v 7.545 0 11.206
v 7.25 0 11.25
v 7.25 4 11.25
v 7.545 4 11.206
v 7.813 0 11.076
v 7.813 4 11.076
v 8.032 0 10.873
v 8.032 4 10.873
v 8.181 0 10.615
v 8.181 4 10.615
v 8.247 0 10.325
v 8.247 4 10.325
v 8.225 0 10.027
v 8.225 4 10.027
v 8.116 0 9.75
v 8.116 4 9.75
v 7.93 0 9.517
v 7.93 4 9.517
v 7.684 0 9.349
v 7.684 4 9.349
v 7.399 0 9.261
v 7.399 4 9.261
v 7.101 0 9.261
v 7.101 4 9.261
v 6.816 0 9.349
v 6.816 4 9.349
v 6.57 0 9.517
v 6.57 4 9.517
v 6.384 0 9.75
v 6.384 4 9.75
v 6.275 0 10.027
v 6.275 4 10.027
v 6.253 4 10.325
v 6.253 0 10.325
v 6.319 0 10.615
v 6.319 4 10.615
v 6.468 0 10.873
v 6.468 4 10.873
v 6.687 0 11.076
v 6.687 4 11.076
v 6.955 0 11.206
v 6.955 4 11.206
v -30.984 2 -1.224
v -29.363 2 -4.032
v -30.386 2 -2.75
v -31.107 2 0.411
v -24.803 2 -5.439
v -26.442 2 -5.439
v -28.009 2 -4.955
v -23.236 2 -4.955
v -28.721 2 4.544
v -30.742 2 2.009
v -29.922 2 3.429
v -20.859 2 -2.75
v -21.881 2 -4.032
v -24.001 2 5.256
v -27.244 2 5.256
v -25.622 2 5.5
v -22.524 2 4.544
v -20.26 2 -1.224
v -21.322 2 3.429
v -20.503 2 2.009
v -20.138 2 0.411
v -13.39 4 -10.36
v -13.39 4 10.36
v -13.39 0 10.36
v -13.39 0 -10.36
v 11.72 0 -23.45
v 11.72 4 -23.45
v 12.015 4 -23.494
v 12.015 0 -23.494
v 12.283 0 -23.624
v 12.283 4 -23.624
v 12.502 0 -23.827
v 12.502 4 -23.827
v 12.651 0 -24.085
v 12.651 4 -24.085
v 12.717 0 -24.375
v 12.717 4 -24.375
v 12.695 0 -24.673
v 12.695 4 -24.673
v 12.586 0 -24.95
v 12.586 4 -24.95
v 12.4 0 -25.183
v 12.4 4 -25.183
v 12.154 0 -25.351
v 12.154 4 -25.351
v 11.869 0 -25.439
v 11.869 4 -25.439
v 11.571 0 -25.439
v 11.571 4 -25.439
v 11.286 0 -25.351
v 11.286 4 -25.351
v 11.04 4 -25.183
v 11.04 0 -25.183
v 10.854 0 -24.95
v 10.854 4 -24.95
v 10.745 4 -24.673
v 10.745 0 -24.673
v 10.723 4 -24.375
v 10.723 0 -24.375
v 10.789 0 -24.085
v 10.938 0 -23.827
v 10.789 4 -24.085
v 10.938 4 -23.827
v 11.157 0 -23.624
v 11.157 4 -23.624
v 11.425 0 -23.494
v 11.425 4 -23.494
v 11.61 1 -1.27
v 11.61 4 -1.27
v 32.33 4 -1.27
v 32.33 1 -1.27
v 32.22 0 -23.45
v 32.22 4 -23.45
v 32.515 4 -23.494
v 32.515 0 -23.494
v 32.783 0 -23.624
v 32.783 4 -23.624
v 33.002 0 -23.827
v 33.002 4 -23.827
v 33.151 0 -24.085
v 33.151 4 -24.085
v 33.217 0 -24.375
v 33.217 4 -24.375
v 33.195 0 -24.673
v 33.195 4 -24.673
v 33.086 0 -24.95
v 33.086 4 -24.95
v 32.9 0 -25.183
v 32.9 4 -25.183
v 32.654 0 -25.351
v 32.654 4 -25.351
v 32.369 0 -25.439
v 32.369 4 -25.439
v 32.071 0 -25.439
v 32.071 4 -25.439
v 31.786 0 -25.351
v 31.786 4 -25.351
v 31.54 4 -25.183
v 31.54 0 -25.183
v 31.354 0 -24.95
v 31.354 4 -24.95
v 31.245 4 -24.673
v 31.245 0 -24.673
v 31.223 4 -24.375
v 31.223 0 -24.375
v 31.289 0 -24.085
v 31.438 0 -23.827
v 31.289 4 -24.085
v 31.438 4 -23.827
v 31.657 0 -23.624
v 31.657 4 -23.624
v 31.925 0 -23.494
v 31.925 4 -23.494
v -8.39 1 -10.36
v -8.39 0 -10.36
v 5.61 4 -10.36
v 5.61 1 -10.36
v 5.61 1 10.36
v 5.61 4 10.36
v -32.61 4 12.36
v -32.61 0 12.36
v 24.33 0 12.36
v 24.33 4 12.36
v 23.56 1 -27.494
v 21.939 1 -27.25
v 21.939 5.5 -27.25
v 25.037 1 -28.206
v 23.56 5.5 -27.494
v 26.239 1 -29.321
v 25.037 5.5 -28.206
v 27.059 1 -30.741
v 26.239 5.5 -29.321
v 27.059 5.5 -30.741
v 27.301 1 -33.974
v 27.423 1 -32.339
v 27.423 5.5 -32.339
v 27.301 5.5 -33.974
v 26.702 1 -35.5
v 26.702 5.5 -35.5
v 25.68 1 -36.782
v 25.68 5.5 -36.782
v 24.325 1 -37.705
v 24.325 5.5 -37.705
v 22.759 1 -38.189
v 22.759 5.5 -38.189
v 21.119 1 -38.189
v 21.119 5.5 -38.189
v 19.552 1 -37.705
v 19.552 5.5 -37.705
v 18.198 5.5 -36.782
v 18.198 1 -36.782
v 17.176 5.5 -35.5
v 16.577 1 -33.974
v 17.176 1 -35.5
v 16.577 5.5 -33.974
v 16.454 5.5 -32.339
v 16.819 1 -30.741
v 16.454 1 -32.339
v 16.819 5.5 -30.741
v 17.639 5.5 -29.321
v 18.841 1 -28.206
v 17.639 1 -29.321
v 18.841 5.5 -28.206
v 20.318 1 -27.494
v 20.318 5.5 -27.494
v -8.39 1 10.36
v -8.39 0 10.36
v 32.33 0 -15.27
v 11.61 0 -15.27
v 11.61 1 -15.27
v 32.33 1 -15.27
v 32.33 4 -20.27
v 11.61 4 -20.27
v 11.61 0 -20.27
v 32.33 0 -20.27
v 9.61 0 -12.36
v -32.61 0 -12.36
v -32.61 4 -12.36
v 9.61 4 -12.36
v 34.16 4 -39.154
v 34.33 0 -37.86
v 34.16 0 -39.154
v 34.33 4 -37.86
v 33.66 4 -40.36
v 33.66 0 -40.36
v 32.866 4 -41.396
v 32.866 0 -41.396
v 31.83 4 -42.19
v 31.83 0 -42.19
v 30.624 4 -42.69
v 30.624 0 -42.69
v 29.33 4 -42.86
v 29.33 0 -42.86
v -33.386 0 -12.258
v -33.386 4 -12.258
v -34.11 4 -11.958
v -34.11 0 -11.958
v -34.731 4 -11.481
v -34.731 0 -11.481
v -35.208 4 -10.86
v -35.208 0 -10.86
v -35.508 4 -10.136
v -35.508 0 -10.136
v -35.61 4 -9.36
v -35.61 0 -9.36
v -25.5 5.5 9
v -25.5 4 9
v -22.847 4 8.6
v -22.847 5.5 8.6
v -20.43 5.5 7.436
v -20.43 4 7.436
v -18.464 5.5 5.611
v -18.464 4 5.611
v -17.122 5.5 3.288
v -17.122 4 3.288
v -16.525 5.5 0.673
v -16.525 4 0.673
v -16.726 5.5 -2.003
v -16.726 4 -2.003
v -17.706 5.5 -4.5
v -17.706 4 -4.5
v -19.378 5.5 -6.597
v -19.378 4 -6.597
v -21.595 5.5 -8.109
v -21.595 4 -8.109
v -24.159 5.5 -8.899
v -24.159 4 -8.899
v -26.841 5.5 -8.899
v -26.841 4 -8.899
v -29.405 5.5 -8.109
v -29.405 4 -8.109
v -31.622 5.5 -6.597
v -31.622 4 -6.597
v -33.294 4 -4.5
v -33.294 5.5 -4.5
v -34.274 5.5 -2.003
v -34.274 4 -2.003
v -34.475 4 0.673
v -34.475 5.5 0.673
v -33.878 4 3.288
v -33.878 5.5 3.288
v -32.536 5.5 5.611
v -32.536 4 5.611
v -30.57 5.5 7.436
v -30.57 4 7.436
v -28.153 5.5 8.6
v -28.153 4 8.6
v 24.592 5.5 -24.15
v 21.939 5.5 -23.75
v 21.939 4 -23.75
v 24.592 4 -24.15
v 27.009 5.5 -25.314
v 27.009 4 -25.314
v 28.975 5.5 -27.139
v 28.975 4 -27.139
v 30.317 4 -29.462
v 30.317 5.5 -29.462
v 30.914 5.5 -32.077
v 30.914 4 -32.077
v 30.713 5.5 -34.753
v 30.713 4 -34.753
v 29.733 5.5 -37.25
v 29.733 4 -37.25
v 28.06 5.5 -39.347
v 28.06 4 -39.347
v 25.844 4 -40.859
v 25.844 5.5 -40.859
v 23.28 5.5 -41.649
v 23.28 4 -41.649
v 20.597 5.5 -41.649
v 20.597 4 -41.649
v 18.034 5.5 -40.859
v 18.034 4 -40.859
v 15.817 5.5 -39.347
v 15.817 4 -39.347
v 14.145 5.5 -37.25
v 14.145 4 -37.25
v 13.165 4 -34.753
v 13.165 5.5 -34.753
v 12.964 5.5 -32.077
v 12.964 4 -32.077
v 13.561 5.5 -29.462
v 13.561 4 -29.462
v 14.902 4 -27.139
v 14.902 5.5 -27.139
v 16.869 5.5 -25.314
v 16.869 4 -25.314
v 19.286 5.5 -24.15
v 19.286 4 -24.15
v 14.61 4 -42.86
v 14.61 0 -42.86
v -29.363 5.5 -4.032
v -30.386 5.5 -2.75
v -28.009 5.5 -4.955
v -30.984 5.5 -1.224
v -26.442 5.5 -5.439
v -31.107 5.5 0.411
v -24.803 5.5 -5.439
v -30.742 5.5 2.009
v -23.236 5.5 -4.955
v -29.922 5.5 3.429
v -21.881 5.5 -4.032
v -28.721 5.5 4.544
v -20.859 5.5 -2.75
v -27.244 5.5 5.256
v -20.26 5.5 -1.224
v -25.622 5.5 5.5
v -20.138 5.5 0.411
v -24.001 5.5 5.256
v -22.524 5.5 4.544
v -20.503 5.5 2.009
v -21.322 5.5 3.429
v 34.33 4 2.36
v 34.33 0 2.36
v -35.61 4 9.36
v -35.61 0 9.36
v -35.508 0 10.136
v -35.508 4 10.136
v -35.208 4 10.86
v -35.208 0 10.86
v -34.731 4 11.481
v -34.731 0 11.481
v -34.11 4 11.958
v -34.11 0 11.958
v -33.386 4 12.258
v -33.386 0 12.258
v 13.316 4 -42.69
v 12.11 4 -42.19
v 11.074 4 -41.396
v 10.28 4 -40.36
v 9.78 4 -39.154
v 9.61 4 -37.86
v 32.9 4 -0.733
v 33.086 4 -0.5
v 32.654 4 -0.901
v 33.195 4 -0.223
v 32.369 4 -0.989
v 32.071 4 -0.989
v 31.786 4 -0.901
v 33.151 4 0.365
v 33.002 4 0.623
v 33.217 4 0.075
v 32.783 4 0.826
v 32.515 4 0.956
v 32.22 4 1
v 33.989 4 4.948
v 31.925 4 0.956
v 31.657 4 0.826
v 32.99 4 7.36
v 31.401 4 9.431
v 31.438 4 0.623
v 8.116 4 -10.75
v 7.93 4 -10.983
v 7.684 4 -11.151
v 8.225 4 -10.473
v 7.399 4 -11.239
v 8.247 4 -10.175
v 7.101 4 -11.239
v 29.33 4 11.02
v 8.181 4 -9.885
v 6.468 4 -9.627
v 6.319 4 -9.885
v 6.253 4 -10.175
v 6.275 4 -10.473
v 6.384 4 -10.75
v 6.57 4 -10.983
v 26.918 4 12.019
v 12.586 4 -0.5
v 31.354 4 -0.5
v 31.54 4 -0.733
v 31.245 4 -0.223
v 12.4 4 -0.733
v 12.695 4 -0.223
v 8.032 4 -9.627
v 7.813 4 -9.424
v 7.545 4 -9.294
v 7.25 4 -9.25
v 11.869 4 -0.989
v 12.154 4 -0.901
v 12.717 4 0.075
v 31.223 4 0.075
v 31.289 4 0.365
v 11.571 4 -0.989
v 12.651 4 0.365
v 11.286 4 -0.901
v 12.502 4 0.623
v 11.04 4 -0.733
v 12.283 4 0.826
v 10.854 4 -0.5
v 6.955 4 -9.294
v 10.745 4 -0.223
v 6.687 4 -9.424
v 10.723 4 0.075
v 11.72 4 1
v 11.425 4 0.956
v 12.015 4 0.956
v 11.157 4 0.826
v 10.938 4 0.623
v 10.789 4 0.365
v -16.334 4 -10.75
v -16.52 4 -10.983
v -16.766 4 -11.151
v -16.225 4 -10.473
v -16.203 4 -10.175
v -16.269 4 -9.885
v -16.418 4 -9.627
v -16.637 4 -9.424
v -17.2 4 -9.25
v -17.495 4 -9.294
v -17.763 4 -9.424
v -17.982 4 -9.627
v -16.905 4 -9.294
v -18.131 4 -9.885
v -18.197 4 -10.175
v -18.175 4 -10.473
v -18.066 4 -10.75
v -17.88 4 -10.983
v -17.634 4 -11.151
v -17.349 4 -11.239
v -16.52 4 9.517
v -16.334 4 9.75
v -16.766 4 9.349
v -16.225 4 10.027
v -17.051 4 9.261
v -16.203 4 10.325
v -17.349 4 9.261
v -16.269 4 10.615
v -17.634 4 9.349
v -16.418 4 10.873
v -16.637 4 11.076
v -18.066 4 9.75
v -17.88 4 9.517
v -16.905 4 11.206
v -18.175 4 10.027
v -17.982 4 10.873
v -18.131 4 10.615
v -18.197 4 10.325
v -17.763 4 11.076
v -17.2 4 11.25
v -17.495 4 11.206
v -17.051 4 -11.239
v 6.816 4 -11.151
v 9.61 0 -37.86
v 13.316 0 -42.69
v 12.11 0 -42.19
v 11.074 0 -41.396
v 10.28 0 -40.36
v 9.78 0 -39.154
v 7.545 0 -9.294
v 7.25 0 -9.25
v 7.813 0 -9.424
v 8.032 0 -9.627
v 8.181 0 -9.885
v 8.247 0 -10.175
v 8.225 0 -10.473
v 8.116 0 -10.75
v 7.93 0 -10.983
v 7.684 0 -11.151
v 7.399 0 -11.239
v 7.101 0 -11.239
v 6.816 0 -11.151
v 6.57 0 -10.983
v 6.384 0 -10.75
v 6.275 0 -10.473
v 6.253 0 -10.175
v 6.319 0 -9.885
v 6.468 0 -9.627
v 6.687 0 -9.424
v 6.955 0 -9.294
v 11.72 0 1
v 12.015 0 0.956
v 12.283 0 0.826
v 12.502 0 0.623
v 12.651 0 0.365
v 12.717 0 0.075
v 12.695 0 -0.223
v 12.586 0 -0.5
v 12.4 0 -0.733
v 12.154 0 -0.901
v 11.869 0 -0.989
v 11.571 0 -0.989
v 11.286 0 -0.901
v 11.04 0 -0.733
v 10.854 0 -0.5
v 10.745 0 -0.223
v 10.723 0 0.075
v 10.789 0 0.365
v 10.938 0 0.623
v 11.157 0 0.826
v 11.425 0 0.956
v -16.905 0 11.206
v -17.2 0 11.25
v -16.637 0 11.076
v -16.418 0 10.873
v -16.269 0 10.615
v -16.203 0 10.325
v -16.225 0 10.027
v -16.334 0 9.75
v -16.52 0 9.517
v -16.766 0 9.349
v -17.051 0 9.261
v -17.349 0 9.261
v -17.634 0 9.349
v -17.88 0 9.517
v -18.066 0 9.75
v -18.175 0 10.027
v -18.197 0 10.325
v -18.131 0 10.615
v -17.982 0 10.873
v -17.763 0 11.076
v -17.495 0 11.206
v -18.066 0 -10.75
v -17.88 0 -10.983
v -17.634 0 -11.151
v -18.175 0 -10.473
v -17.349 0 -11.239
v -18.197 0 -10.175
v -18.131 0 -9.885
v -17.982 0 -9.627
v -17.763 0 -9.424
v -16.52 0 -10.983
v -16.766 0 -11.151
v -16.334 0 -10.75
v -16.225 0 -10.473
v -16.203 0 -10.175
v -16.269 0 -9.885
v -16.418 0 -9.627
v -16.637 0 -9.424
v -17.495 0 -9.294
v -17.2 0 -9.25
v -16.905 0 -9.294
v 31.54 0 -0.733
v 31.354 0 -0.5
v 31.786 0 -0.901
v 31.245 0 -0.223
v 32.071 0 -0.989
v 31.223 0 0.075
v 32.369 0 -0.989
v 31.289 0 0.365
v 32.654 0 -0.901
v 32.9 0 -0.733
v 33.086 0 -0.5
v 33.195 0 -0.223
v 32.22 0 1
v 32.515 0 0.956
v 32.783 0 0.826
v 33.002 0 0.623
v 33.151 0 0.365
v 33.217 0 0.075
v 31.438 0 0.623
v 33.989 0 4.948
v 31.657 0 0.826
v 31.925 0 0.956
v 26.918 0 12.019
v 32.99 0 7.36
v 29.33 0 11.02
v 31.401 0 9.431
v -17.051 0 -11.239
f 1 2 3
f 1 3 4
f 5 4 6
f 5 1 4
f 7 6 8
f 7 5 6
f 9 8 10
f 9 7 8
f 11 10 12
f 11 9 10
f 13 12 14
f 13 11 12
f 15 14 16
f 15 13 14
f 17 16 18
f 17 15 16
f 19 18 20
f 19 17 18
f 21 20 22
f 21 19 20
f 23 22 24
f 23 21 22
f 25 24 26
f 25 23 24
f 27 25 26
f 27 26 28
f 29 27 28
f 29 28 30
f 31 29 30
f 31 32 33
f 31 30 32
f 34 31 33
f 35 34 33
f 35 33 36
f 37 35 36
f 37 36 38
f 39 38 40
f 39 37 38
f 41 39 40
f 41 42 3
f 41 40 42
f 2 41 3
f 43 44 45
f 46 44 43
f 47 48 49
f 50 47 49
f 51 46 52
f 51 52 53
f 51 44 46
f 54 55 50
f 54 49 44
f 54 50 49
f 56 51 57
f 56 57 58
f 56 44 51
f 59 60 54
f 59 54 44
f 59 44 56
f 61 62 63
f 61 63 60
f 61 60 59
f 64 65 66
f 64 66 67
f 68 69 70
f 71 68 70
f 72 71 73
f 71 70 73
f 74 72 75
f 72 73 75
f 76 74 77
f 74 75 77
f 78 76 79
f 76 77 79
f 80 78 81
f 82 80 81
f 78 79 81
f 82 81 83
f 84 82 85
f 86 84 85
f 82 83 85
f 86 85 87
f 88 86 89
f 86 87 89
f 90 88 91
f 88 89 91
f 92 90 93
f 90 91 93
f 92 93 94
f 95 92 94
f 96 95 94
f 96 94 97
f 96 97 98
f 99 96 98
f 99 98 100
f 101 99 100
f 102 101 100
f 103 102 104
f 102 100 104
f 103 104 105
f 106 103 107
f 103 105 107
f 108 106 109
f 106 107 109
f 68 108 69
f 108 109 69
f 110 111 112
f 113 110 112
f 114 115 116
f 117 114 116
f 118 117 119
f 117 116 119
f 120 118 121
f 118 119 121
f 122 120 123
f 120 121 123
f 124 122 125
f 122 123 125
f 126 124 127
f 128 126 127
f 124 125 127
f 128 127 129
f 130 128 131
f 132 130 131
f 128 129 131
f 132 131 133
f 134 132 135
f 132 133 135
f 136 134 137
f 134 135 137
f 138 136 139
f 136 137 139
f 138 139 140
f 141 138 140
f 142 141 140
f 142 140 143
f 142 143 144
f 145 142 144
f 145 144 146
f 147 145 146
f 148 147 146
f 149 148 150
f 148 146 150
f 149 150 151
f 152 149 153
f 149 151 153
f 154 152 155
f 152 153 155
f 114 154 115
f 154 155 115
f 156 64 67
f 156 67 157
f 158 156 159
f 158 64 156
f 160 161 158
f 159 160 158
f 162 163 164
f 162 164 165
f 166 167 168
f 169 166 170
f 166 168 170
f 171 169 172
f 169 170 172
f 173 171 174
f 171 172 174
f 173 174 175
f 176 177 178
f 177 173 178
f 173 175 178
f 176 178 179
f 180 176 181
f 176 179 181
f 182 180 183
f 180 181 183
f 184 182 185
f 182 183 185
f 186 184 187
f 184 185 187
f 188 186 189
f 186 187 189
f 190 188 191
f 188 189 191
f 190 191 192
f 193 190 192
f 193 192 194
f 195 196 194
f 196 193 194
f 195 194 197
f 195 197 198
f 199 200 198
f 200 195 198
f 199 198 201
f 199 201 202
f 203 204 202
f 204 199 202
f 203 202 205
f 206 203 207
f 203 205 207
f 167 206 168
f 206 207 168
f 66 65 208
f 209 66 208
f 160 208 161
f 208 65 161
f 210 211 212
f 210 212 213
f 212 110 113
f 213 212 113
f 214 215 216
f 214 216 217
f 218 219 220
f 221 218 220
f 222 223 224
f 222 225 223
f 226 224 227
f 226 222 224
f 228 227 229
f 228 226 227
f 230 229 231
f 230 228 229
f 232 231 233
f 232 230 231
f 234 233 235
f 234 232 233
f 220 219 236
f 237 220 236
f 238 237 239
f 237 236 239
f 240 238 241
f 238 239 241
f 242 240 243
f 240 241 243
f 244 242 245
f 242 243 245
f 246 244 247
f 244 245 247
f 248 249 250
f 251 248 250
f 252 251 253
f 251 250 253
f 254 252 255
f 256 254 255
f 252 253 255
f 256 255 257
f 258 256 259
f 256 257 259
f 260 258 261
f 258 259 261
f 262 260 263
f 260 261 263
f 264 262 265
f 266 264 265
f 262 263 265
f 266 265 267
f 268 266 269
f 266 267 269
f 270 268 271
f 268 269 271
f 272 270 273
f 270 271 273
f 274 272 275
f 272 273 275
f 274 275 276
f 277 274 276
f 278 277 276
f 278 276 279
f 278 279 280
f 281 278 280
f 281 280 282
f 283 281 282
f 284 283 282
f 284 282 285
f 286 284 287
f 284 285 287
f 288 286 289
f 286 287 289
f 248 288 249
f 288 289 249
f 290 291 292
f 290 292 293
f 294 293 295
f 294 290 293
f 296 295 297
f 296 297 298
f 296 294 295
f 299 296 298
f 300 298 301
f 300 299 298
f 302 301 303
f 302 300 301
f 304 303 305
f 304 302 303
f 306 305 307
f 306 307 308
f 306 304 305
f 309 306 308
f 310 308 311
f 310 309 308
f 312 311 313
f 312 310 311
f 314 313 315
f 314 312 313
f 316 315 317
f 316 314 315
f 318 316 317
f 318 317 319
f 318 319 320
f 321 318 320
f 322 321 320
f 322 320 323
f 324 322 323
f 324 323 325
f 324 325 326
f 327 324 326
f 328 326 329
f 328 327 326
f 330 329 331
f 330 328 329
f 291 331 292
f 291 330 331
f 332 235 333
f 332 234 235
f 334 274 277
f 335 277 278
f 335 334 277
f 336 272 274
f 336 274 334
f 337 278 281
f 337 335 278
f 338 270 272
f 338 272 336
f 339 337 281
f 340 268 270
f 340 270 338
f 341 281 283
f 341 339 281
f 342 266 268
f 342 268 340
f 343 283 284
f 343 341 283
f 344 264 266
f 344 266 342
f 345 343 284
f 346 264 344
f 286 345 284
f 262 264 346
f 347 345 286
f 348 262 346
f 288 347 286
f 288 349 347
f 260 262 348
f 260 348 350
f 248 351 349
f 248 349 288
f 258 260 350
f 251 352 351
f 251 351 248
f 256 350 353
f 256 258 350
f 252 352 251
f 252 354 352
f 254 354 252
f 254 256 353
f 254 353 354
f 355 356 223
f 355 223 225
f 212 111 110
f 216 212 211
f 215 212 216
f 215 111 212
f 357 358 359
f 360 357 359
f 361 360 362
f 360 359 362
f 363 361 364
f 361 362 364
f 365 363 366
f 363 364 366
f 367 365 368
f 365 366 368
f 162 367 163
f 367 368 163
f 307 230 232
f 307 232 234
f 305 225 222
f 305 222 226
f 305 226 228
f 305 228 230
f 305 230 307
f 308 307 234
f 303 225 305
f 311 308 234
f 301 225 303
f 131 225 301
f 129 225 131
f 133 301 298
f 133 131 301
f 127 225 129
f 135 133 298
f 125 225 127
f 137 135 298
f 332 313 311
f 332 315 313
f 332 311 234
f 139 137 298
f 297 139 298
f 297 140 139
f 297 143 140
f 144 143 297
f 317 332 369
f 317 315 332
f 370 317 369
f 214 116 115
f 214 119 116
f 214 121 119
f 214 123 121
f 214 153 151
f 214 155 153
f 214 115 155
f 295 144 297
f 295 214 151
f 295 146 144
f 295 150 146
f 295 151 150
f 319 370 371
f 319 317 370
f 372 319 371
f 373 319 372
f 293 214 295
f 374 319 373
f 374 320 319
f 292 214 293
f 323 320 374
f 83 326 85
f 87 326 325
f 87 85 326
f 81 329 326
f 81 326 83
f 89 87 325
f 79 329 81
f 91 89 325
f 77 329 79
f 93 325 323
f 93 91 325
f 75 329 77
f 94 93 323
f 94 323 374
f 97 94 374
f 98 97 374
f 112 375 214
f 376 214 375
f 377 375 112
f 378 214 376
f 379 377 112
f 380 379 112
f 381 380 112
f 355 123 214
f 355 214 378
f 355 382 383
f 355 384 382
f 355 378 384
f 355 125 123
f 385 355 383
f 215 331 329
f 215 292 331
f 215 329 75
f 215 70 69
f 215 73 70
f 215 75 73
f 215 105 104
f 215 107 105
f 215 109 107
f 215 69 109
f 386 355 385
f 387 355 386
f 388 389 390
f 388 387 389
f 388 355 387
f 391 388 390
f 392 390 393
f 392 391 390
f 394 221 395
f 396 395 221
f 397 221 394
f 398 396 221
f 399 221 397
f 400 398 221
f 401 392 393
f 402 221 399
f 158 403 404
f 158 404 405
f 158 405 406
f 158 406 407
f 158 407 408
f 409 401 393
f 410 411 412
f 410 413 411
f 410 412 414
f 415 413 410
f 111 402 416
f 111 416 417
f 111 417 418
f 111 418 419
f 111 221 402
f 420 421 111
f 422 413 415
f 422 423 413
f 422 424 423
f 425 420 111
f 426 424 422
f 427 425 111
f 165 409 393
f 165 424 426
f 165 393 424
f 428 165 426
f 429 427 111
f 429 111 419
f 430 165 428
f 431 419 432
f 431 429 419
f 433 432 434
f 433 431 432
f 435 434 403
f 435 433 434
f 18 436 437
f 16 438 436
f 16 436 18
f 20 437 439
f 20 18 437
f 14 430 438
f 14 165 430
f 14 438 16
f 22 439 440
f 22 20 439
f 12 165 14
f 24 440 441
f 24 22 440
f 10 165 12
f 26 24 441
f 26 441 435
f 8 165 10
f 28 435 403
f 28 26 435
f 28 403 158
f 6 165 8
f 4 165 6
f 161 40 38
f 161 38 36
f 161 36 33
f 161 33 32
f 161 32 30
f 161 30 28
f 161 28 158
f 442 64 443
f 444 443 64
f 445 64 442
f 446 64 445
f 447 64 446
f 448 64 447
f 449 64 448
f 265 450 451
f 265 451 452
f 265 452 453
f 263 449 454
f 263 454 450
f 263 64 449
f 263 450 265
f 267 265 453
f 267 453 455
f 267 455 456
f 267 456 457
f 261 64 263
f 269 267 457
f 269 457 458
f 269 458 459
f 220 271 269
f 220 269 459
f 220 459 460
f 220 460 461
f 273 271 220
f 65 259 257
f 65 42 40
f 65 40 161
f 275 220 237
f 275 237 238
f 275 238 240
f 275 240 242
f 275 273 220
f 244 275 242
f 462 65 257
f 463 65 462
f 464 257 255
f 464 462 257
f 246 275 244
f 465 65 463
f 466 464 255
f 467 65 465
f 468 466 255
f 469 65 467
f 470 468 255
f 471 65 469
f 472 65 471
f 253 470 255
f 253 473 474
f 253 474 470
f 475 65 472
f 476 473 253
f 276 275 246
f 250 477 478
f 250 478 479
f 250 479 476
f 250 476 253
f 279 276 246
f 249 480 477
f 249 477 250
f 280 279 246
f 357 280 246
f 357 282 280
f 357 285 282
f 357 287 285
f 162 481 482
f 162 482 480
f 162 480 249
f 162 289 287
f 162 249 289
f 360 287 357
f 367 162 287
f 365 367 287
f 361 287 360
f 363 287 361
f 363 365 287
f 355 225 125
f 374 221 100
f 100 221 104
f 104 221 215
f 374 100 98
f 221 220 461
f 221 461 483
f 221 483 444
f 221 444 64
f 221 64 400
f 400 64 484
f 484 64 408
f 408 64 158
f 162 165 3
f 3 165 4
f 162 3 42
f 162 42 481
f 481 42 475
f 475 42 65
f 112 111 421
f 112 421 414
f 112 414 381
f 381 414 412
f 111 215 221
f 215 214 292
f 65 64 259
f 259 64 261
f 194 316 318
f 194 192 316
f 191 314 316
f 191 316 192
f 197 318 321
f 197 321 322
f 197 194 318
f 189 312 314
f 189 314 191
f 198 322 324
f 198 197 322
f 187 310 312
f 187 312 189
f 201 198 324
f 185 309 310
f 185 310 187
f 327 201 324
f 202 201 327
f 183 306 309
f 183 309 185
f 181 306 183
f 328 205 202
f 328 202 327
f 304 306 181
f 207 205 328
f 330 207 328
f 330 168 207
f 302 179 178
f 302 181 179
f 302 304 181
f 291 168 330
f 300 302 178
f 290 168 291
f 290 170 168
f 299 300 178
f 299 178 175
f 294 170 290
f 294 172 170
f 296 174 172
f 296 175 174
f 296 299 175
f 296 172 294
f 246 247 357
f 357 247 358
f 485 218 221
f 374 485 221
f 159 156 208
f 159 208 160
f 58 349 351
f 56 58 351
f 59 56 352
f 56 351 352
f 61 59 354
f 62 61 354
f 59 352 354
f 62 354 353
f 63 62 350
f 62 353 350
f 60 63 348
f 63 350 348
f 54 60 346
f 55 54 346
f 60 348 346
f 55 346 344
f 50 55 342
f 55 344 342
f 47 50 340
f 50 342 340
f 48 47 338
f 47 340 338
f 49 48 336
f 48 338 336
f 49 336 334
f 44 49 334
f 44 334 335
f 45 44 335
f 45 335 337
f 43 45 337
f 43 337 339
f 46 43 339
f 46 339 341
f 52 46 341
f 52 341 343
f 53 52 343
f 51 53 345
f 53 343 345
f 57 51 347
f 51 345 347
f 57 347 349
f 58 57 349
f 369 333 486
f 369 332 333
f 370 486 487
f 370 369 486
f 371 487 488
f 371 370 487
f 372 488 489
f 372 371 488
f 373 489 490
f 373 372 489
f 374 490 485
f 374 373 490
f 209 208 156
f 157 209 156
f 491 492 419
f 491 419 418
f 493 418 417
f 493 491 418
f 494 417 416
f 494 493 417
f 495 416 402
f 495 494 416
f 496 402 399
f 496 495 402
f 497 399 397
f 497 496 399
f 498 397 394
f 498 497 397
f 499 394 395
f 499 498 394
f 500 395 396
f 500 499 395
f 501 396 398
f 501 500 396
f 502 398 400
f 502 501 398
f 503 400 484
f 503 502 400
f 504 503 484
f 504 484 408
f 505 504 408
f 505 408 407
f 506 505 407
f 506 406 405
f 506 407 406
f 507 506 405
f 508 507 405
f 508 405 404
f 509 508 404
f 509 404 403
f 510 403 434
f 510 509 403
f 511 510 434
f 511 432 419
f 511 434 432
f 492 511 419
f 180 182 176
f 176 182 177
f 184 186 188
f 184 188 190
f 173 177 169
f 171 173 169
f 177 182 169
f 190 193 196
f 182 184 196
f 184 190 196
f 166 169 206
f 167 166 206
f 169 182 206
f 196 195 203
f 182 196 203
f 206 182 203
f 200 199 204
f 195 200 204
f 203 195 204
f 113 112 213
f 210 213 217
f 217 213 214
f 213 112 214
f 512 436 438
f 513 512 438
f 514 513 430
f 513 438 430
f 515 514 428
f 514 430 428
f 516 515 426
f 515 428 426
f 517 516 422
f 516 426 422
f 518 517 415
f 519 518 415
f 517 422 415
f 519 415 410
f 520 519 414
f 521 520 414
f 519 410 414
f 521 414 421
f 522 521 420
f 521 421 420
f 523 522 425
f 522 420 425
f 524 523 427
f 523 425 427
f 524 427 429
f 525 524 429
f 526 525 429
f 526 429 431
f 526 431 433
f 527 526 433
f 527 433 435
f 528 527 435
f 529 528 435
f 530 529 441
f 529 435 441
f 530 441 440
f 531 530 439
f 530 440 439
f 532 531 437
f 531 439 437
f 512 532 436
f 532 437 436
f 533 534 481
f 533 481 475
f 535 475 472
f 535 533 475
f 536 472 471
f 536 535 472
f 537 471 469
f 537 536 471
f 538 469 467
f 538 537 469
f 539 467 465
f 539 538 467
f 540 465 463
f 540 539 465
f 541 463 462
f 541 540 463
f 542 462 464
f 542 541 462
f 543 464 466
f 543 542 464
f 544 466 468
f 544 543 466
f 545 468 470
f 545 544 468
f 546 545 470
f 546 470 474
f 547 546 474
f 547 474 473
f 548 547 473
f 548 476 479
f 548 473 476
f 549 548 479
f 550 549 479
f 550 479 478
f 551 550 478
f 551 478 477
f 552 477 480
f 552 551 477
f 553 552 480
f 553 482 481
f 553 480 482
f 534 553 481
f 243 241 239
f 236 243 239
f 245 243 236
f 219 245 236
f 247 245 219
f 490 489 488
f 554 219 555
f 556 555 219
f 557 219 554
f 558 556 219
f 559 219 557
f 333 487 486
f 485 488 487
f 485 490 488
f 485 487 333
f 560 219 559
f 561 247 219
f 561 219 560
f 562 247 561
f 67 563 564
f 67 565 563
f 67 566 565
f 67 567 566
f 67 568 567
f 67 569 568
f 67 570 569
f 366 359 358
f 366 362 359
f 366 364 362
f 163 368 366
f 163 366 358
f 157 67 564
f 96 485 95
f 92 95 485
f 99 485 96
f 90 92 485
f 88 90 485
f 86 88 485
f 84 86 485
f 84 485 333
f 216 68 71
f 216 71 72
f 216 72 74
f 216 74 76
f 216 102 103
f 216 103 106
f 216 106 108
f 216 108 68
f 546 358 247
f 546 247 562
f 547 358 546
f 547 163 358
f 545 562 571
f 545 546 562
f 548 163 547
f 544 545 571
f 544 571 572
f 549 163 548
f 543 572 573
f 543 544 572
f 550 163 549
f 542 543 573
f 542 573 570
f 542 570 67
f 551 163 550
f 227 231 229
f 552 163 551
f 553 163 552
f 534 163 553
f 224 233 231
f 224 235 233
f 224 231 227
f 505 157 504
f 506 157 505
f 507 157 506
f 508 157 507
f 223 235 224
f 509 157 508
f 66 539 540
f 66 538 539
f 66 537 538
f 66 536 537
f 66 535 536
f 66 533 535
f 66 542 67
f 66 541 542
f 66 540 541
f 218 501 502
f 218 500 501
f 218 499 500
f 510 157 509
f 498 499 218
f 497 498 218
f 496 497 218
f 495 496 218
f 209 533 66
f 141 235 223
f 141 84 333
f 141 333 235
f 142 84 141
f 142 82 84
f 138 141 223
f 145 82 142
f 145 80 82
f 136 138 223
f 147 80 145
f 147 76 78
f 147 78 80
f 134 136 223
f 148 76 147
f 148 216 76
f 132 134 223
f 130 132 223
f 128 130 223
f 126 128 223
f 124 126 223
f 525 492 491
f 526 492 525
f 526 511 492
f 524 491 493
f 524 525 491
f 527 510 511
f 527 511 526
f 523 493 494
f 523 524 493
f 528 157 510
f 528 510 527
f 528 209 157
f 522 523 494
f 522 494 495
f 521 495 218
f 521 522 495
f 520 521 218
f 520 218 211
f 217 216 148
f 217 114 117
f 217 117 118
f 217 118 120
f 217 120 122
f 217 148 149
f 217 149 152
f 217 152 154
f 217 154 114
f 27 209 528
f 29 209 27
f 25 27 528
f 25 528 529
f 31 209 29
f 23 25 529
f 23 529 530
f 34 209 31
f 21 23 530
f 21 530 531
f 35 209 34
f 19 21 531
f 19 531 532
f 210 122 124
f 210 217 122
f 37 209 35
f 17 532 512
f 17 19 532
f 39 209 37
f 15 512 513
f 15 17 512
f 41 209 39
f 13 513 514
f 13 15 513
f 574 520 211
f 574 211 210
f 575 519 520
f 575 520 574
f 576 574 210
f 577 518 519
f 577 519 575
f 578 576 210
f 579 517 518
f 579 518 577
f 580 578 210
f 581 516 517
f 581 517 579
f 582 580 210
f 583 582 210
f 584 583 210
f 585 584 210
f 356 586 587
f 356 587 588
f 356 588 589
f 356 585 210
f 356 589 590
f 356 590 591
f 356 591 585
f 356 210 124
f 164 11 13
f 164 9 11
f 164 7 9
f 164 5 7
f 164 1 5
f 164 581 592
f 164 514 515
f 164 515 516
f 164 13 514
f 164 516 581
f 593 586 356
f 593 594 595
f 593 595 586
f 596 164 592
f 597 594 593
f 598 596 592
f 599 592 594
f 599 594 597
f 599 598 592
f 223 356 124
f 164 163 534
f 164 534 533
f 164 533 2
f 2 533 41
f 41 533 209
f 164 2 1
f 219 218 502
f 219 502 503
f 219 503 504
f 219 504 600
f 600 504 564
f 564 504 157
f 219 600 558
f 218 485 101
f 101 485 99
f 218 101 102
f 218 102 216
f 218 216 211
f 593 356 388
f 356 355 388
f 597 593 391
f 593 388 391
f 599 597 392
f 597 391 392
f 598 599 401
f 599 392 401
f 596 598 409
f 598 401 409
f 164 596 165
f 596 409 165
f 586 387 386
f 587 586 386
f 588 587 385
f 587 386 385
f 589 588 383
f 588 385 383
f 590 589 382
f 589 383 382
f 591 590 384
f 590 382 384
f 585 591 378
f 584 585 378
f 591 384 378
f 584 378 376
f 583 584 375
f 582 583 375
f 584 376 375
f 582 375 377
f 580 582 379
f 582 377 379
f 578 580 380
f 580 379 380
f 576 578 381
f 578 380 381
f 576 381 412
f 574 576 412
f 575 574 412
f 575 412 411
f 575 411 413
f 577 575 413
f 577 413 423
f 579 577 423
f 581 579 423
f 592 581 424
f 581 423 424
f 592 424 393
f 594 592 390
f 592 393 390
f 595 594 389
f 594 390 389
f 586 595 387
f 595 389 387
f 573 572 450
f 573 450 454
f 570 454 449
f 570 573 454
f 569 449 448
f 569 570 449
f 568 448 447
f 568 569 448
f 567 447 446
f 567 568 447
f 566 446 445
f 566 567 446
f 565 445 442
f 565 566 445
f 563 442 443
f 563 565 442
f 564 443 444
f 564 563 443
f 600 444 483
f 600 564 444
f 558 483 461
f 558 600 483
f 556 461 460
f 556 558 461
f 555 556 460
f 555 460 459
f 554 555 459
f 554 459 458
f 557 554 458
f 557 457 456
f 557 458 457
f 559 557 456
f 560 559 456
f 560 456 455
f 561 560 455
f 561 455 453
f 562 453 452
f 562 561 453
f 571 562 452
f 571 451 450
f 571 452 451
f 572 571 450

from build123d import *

# Parameters (mm, degrees)
EXTRUDE_1_DEPTH          = 4
CUT_EXTRUDE_1_DEPTH      = 38.905694823
CUT_EXTRUDE_1_DEPTH_BACK = 38.905694823
SKETCH_2_R               = 1
SKETCH_3_W               = 14
SKETCH_3_H               = 20.72
CUT_EXTRUDE_3_DEPTH      = 3
SKETCH_5_W               = 5
SKETCH_5_H               = 20.72
CUT_EXTRUDE_4_DEPTH      = 4
SKETCH_6_R               = 9
EXTRUDE_2_DEPTH          = 1.5
SKETCH_10_R              = 5.5
CUT_EXTRUDE_6_DEPTH      = 3.5
SKETCH_12_W              = 24.72
SKETCH_12_H              = 4
EXTRUDE_3_DEPTH          = 24.72
SKETCH_14_W              = 24.72
SKETCH_14_H              = 4
EXTRUDE_4_DEPTH          = 30.5
SKETCH_15_R              = 1
SKETCH_15_R_2            = 5.5
CUT_EXTRUDE_7_DEPTH      = 4
EXTRUDE_START            = 1.5
SKETCH_16_R              = 9
SKETCH_16_R_2            = 5.5
EXTRUDE_5_DEPTH          = 1.5
SKETCH_17_W              = 20.72
SKETCH_17_H              = 19
CUT_EXTRUDE_8_DEPTH      = 4
SKETCH_19_W              = 20.72
SKETCH_19_H              = 14
EXTRUDE_6_DEPTH          = 1
EXTRUDE_START_2          = -1
SKETCH_20_R              = 5.5
EXTRUDE_7_DEPTH          = 1
FILLET_1_R               = 5
FILLET_2_R               = 5
FILLET_6_R               = 10


with BuildPart() as part:
    # 草图1 → 凸台-拉伸1 (new body)
    with BuildSketch(Plane(origin=(0, 0, 0), x_dir=(1, 0, 0), z_dir=(0, 1, 0))):
        with BuildLine():
            Line((6.61, -12.36), (9.61, -12.36))
            Line((9.61, -12.36), (9.61, -9.36))
            Line((9.61, -9.36), (9.61, 9.36))
            Line((9.61, 9.36), (9.61, 12.36))
            Line((9.61, 12.36), (6.61, 12.36))
            Line((6.61, 12.36), (-32.61, 12.36))
            ThreePointArc((-32.61, 12.36), (-34.731320344, 11.481320344), (-35.61, 9.36))
            Line((-35.61, 9.36), (-35.61, -9.36))
            ThreePointArc((-35.61, -9.36), (-34.731320344, -11.481320344), (-32.61, -12.36))
            Line((-32.61, -12.36), (6.61, -12.36))
        make_face()
    extrude(amount=EXTRUDE_1_DEPTH)

    # 草图2 → 切除-拉伸1 (cut, two sides: drawn at the far end of the back side and taken through both)
    with BuildSketch(Plane(origin=(0, 0, 0), x_dir=(1, 0, 0), z_dir=(0, 1, 0)).offset(-CUT_EXTRUDE_1_DEPTH_BACK)):
        with Locations(Location((7.25, -10.25, 0), (0, 0, 270))):
            Circle(SKETCH_2_R)
        with Locations(Location((7.25, 10.25, 0), (0, 0, 270))):
            Circle(SKETCH_2_R)
        with Locations(Location((-17.2, -10.25, 0), (0, 0, 270))):
            Circle(SKETCH_2_R)
        with Locations(Location((-17.2, 10.25, 0), (0, 0, 270))):
            Circle(SKETCH_2_R)
    extrude(amount=CUT_EXTRUDE_1_DEPTH + CUT_EXTRUDE_1_DEPTH_BACK, mode=Mode.SUBTRACT)

    # 草图3 → 切除-拉伸3 (cut)
    with BuildSketch(Plane(origin=(0, 4, 0), x_dir=(1, 0, 0), z_dir=(0, 1, 0))):
        with Locations((-1.39, 0)):
            Rectangle(SKETCH_3_W, SKETCH_3_H)
    extrude(amount=-CUT_EXTRUDE_3_DEPTH, mode=Mode.SUBTRACT)

    # 草图5 → 切除-拉伸4 (cut)
    with BuildSketch(Plane(origin=(0, 4, 0), x_dir=(1, 0, 0), z_dir=(0, 1, 0))):
        with Locations((-10.89, 0)):
            Rectangle(SKETCH_5_W, SKETCH_5_H)
    extrude(amount=-CUT_EXTRUDE_4_DEPTH, mode=Mode.SUBTRACT)

    # 草图6 → 凸台-拉伸2 (add)
    with BuildSketch(Plane(origin=(0, 4, 0), x_dir=(1, 0, 0), z_dir=(0, 1, 0))):
        with Locations(Location((-25.5, 0, 0), (0, 0, 270))):
            Circle(SKETCH_6_R)
    extrude(amount=EXTRUDE_2_DEPTH)

    # 草图10 → 切除-拉伸6 (cut)
    with BuildSketch(Plane(origin=(0, 5.5, 0), x_dir=(1, 0, 0), z_dir=(0, 1, 0))):
        with Locations(Location((-25.62236192, 0, 0), (0, 0, 270))):
            Circle(SKETCH_10_R)
    extrude(amount=-CUT_EXTRUDE_6_DEPTH, mode=Mode.SUBTRACT)

    # 草图12 → 凸台-拉伸3 (add)
    with BuildSketch(Plane(origin=(9.61, 0, 0), x_dir=(0, 0, -1), z_dir=(1, 0, 0))):
        with Locations((0, 2)):
            Rectangle(SKETCH_12_W, SKETCH_12_H)
    extrude(amount=EXTRUDE_3_DEPTH)

    # 草图14 → 凸台-拉伸4 (add)
    with BuildSketch(Plane(origin=(0, 0, -12.36), x_dir=(-1, 0, 0), z_dir=(0, 0, -1))):
        with Locations((-21.97, 2)):
            Rectangle(SKETCH_14_W, SKETCH_14_H)
    extrude(amount=EXTRUDE_4_DEPTH)

    # 草图15 → 切除-拉伸7 (cut)
    with BuildSketch(Plane(origin=(0, 4, 0), x_dir=(1, 0, 0), z_dir=(0, 1, 0))):
        with Locations(Location((11.72, 24.45, 0), (0, 0, 270))):
            Circle(SKETCH_15_R)
        with Locations(Location((32.22, 24.45, 0), (0, 0, 270))):
            Circle(SKETCH_15_R)
        with Locations(Location((11.72, 0, 0), (0, 0, 270))):
            Circle(SKETCH_15_R)
        with Locations(Location((32.22, 0, 0), (0, 0, 270))):
            Circle(SKETCH_15_R)
        with Locations(Location((21.938853273, 32.75, 0), (0, 0, 270))):
            Circle(SKETCH_15_R_2)
    extrude(amount=-CUT_EXTRUDE_7_DEPTH, mode=Mode.SUBTRACT)

    # 草图16 → 凸台-拉伸5 (add)
    with BuildSketch(Plane(origin=(0, 4, 0), x_dir=(1, 0, 0), z_dir=(0, 1, 0)).offset(EXTRUDE_START)):
        with Locations(Location((21.938853273, 32.75, 0), (0, 0, 270))):
            Circle(SKETCH_16_R)
        with Locations(Location((21.938853273, 32.75, 0), (0, 0, 270))):
            Circle(SKETCH_16_R_2, mode=Mode.SUBTRACT)
    extrude(amount=-EXTRUDE_5_DEPTH)

    # 草图17 → 切除-拉伸8 (cut)
    with BuildSketch(Plane(origin=(0, 4, 0), x_dir=(1, 0, 0), z_dir=(0, 1, 0))):
        with Locations((21.97, 10.77)):
            Rectangle(SKETCH_17_W, SKETCH_17_H)
    extrude(amount=-CUT_EXTRUDE_8_DEPTH, mode=Mode.SUBTRACT)

    # 草图19 → 凸台-拉伸6 (add)
    with BuildSketch(Plane.XZ):
        with Locations((21.97, -8.27)):
            Rectangle(SKETCH_19_W, SKETCH_19_H)
    extrude(amount=-EXTRUDE_6_DEPTH)

    # 草图20 → 凸台-拉伸7 (add)
    with BuildSketch(Plane.XZ.offset(EXTRUDE_START_2)):
        with Locations(Location((21.938853273, -32.75, 0), (0, 0, 90))):
            Circle(SKETCH_20_R)
    extrude(amount=EXTRUDE_7_DEPTH)

    # 圆角1
    fillet_1_edges = [part.edges().sort_by_distance(p)[0] for p in [
        (34.33, 2, -42.86),
    ]]
    fillet(fillet_1_edges, radius=FILLET_1_R)

    # 圆角2
    fillet_2_edges = [part.edges().sort_by_distance(p)[0] for p in [
        (9.61, 2, -42.86),
    ]]
    fillet(fillet_2_edges, radius=FILLET_2_R)

    # 圆角6
    fillet_6_edges = [part.edges().sort_by_distance(p)[0] for p in [
        (34.33, 2, 12.36),
    ]]
    fillet(fillet_6_edges, radius=FILLET_6_R)


solid = part.part
